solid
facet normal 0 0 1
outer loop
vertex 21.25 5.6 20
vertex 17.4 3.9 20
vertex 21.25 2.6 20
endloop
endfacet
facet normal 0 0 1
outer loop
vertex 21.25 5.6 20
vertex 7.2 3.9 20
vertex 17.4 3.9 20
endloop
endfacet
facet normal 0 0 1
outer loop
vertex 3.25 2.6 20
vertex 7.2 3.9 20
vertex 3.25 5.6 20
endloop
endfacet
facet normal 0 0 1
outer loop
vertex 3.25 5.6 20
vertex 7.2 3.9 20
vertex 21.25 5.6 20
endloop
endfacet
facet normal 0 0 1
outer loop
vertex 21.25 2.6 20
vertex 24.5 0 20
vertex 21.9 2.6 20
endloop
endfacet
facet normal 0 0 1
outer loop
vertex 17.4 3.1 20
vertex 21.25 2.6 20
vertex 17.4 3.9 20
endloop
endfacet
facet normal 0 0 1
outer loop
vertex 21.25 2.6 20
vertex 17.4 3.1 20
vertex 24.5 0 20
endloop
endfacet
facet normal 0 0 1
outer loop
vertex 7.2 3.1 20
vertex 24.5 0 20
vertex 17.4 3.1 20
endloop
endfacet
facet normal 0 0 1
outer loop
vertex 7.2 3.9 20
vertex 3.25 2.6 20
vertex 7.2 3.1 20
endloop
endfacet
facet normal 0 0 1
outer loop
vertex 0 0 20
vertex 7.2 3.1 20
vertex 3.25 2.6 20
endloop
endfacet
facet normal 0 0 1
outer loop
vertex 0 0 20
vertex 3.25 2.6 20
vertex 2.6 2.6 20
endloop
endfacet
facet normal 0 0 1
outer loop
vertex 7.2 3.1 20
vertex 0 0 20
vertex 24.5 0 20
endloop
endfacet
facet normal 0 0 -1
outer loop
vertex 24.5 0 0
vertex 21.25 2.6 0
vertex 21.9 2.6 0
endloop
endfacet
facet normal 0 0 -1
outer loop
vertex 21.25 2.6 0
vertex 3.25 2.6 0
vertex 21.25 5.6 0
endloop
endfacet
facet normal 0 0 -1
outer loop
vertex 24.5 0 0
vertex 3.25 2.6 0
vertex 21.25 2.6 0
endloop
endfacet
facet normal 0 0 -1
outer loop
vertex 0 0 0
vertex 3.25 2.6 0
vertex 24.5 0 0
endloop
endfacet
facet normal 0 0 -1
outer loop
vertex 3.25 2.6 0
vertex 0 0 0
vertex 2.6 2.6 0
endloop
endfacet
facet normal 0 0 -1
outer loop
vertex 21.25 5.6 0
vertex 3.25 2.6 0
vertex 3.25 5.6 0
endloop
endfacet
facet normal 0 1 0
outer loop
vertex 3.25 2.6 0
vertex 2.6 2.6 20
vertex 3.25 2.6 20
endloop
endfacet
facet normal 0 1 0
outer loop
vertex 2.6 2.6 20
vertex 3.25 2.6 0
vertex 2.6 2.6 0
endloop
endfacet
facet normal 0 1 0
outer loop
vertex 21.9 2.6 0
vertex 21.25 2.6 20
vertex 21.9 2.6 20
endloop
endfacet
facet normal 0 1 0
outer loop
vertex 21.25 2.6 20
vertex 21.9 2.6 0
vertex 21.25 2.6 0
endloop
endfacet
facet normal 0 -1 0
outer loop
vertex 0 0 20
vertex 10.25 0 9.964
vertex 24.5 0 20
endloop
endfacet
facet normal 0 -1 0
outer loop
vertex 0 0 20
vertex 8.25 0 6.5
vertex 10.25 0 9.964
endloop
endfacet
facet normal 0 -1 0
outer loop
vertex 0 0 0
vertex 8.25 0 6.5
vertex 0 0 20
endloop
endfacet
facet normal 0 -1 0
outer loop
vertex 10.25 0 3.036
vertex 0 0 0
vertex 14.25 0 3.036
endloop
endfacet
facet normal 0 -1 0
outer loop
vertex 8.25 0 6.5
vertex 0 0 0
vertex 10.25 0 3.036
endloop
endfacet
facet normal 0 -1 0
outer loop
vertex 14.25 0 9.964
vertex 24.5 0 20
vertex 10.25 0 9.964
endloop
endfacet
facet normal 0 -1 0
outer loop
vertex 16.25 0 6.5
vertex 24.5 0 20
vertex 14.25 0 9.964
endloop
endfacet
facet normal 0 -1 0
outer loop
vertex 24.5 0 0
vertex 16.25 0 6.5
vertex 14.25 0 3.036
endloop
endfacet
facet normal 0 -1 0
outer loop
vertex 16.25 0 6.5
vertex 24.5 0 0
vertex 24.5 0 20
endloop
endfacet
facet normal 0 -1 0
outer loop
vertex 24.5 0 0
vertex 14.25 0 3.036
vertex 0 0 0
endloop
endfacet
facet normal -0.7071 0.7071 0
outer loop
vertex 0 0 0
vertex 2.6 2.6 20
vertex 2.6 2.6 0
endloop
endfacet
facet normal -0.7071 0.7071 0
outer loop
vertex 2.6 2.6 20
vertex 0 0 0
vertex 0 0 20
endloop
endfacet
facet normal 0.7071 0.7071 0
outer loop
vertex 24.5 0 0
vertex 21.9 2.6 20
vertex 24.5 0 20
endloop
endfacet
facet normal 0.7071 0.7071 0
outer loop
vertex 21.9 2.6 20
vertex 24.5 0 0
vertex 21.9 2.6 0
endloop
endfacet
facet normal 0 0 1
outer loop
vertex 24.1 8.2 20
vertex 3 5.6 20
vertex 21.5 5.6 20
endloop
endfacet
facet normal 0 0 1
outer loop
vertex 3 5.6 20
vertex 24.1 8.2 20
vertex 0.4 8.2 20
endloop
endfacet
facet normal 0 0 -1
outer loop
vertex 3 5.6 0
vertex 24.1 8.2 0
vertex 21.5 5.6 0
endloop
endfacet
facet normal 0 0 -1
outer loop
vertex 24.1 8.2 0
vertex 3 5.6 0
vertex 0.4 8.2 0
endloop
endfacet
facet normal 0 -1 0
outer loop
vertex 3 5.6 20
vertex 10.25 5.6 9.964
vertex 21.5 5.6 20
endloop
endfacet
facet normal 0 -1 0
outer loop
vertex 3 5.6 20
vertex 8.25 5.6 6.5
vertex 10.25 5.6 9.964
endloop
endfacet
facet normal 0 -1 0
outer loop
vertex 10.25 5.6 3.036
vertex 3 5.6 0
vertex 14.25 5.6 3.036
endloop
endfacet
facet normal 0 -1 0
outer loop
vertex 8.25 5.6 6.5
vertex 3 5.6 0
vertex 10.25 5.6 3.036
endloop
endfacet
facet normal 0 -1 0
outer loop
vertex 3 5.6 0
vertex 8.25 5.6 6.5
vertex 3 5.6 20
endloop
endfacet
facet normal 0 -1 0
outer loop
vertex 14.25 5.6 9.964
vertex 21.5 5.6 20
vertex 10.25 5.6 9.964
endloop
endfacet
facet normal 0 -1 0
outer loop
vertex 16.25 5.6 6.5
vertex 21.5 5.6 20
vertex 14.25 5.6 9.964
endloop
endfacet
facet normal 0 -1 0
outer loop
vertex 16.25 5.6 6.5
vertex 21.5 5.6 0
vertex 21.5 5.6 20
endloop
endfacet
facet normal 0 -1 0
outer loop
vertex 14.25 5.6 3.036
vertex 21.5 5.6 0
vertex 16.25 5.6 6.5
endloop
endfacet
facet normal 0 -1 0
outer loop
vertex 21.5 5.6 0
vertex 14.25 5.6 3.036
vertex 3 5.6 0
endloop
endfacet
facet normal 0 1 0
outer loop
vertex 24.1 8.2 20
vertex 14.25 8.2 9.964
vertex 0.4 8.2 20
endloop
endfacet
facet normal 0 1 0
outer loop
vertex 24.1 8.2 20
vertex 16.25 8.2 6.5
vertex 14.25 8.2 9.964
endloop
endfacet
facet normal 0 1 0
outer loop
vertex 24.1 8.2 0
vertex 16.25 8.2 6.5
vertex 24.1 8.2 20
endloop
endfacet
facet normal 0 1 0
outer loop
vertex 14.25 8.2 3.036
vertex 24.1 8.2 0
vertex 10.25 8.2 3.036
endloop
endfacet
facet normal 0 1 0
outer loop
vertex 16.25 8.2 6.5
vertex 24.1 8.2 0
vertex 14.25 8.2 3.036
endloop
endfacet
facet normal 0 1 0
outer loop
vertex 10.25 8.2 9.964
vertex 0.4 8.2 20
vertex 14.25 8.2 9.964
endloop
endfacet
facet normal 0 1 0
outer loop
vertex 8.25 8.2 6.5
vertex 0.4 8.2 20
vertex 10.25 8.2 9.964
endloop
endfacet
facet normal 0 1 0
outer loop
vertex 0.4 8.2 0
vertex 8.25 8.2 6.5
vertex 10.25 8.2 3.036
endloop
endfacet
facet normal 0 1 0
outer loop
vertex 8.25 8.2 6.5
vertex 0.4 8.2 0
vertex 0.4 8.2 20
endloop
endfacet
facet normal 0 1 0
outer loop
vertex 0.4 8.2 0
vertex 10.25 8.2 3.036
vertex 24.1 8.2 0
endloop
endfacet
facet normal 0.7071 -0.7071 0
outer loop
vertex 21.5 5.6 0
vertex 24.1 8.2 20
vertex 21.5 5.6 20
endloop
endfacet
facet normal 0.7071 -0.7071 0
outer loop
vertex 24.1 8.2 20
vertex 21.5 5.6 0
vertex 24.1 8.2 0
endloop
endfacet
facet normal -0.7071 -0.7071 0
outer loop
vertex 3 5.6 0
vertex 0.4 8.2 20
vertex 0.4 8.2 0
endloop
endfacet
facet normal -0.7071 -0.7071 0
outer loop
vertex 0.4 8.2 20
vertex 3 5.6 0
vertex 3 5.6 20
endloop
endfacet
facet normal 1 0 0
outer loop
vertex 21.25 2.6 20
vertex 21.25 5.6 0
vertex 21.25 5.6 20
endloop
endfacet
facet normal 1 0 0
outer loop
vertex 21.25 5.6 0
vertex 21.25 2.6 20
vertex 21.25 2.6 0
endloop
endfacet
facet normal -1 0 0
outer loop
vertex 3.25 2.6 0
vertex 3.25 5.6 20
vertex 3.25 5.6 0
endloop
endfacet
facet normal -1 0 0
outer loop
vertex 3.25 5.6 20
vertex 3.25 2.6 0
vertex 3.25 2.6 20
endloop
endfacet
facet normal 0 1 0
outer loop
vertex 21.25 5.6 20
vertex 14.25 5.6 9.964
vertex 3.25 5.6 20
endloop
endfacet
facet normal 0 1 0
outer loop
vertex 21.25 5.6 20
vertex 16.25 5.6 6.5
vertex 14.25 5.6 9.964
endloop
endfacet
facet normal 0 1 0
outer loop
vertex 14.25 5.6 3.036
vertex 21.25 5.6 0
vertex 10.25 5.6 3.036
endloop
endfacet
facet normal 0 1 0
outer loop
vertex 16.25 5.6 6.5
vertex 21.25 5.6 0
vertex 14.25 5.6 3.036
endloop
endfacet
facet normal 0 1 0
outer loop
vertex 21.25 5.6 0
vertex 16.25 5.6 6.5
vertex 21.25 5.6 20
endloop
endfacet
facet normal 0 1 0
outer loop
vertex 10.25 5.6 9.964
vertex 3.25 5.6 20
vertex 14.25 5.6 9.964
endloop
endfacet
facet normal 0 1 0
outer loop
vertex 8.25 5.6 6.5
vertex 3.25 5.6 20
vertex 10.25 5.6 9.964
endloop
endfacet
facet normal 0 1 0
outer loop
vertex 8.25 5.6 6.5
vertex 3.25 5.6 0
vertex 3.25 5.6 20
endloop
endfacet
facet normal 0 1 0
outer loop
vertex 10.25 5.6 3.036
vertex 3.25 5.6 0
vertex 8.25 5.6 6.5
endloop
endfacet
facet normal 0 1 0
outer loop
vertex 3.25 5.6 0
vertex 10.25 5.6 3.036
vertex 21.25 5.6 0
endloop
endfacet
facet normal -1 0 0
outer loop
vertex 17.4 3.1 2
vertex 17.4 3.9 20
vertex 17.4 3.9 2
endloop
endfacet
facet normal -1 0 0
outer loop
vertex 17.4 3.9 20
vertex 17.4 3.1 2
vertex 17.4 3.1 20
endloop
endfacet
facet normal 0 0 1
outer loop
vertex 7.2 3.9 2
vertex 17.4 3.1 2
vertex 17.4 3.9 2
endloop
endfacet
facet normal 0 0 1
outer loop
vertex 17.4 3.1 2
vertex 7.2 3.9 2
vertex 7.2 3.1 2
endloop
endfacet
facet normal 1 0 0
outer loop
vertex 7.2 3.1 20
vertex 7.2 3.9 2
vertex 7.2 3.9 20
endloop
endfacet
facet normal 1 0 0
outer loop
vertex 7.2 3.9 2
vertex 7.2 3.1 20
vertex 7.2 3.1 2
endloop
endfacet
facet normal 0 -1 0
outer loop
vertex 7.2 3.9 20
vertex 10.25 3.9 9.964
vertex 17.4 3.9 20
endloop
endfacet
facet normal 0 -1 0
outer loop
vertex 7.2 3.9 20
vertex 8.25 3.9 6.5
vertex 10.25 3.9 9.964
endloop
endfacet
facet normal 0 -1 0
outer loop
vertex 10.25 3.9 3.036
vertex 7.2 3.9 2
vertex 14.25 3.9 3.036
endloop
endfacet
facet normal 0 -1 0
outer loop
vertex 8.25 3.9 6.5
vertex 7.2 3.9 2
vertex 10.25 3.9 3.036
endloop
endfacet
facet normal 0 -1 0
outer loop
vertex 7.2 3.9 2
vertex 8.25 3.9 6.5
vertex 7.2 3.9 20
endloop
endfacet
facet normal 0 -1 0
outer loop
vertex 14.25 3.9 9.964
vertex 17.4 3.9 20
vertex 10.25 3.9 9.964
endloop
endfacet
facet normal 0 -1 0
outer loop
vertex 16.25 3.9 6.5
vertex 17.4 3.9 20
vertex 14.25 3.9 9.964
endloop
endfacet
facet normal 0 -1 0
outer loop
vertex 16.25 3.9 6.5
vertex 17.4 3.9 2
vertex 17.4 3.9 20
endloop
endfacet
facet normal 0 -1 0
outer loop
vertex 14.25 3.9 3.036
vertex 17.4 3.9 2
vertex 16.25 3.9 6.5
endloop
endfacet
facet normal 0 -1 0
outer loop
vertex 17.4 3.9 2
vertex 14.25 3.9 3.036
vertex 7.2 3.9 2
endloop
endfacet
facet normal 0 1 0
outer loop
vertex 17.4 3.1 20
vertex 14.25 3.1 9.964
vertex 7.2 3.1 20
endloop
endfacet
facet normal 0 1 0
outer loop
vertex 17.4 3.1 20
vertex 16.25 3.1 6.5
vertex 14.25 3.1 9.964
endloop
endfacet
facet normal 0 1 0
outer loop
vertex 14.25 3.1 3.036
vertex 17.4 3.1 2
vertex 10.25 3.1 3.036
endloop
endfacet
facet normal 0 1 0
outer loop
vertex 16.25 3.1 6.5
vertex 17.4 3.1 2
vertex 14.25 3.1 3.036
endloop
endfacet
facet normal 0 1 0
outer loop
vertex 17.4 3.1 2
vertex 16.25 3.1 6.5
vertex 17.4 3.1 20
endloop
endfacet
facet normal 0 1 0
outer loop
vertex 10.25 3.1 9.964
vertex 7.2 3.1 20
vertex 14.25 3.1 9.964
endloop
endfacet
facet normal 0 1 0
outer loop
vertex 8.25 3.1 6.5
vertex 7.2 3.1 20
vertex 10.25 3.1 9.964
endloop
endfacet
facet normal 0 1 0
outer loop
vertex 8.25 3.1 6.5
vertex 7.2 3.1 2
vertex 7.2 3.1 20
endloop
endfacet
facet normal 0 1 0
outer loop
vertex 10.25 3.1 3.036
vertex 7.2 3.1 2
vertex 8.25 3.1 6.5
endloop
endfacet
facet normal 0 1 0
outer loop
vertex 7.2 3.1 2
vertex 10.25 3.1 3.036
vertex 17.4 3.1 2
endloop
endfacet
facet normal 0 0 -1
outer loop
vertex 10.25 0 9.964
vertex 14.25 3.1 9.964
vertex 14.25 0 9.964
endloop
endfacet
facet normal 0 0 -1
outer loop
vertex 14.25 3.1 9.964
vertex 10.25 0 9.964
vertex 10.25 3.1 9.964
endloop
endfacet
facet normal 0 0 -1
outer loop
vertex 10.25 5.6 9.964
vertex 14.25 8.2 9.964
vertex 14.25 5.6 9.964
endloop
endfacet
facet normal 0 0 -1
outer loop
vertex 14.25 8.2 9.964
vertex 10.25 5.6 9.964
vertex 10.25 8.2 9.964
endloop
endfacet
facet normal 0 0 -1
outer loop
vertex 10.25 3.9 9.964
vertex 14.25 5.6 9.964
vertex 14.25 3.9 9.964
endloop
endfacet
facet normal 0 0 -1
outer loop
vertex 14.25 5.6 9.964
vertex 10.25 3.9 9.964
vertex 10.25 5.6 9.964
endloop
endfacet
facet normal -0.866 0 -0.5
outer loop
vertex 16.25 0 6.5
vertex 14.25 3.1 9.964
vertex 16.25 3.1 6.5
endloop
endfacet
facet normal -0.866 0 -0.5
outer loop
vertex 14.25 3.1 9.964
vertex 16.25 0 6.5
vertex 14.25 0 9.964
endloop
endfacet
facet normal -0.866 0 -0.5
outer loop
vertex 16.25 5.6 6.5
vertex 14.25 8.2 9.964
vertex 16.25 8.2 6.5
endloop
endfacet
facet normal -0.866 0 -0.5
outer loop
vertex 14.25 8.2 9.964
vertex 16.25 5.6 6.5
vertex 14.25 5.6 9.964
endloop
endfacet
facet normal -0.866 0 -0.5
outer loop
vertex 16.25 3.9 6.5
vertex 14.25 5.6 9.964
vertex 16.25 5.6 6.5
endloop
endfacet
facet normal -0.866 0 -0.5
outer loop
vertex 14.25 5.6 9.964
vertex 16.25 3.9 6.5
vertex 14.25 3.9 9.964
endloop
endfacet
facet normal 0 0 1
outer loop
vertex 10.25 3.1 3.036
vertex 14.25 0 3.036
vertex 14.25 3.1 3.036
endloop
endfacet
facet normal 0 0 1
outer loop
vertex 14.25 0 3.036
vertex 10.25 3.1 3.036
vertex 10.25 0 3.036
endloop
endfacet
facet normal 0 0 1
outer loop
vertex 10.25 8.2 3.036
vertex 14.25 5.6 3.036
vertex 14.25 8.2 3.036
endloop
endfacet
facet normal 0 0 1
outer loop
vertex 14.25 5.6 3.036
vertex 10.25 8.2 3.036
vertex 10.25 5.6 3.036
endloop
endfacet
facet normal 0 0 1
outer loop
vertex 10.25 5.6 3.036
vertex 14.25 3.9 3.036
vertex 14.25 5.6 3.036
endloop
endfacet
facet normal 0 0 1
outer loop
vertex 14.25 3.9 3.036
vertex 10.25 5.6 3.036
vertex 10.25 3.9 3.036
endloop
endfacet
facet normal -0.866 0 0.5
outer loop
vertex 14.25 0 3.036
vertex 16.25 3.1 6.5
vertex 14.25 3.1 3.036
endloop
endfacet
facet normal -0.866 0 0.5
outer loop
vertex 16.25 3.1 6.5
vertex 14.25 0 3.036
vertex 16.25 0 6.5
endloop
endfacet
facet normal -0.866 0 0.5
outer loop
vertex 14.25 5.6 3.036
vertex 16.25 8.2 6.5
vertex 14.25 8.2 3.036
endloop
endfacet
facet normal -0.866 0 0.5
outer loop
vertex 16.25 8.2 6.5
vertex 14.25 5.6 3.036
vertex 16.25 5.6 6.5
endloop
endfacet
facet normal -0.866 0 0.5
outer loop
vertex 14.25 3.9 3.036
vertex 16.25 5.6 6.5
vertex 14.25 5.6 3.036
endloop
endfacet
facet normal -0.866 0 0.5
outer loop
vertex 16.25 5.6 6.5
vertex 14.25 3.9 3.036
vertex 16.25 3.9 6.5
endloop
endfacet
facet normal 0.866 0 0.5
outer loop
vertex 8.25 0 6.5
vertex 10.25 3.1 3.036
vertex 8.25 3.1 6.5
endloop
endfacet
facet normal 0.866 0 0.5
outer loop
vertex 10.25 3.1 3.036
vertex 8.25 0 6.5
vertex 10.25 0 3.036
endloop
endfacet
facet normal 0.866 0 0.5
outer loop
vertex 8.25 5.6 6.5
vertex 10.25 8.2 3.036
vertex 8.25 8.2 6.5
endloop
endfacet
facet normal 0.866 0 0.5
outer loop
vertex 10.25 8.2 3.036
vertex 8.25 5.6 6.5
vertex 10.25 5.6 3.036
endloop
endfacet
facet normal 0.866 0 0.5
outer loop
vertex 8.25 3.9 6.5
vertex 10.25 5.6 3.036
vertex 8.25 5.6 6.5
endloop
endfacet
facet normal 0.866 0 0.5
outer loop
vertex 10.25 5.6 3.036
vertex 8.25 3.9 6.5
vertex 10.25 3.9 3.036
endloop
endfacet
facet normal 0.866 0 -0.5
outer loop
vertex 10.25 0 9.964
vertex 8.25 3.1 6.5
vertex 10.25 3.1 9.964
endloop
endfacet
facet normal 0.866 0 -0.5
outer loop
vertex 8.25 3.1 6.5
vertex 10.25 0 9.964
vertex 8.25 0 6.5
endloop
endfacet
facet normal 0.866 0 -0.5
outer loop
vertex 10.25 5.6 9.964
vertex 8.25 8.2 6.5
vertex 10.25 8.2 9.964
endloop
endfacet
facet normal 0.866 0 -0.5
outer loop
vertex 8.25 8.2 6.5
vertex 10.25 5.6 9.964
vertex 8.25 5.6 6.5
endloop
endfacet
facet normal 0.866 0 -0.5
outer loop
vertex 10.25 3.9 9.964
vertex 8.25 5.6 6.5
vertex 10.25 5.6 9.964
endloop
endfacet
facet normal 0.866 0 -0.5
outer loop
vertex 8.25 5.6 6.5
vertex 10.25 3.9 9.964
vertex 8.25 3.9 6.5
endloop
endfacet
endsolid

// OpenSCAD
include <antFarm.scad>;


alienHeight = z; // 19.5;
alienThick = 2.6;
alienSmall = 23.7;
alienLarge = 24.5;

//alienToXav(alienLarge, 2, 1);  // For new alien modules
//alienToXav(alienSmall, 2, 1);  // For old alien modules
//alienShutter(alienSmall);  // For old alien modules


module alienToXav(alienMaxWidth, spacing, type = 0) {
    difference() {

        union() {
            difference() {
                closableJoin(spacing, type);
                translate([-30, -spacing - 7.5, 0]) {
                    cube([60, 5, z]);
                }
                if(type == 0) {
                    translate([16.5, 35, -6])
                        rotate([0, 0, 30])
                            cylinder(d=8, h=20, $fn=6);
                }
            }
            translate([-alienMaxWidth/2, -spacing - 2.5, 0])
                alienShutter(alienMaxWidth);
        }
        if(type == 0) {
            translate([0, -10, 6])
                rotate([-80, 0, 0])
                    cylinder(d=9, h=20, $fn=6);
        } else {
            translate([-doorSquareOpeningWidth/2, -10, 2])
                rotate([10, 0, 0])
                    squareDoorOpening(20);
        }
    }

}

module alienShutter(alienMaxWidth) {
    difference() {
        cube([alienMaxWidth, alienThick, alienHeight]);
        rotate([0, 0, 45])
        cube([5, 5, alienHeight + 1]);

        translate([alienMaxWidth, 0, 0])
        rotate([0, 0, 45])
        cube([5, 5, alienHeight + 1]);
    }
}

alienToAlien();

module alienToAlien() {
    spacer = 3;
    spacerWidth = 18;
    diamOpening = 8;

    difference() {
        union() {
            alienShutter(alienLarge);

            translate([23.7 + 0.4, spacer + 2*alienThick, 0])
                rotate([0, 0, 180])
                    alienShutter(alienSmall);

            translate([(alienLarge - spacerWidth)/2, alienThick, 0])
                cube([spacerWidth, spacer, alienHeight]);
        }
        // door slot
        translate([(alienLarge - doorWidth)/2 - tol, (doorThick + alienThick), 2]) {
            cube([doorWidth + 3*tol, doorThick + 3*tol, z]);
        }
        translate([alienLarge/2, -1, diamOpening/2 + 2.5])
            rotate([-90, 0, 0])
                cylinder(d=diamOpening, h=spacer + 2*alienThick + 2, $fn=6);
    }
}
